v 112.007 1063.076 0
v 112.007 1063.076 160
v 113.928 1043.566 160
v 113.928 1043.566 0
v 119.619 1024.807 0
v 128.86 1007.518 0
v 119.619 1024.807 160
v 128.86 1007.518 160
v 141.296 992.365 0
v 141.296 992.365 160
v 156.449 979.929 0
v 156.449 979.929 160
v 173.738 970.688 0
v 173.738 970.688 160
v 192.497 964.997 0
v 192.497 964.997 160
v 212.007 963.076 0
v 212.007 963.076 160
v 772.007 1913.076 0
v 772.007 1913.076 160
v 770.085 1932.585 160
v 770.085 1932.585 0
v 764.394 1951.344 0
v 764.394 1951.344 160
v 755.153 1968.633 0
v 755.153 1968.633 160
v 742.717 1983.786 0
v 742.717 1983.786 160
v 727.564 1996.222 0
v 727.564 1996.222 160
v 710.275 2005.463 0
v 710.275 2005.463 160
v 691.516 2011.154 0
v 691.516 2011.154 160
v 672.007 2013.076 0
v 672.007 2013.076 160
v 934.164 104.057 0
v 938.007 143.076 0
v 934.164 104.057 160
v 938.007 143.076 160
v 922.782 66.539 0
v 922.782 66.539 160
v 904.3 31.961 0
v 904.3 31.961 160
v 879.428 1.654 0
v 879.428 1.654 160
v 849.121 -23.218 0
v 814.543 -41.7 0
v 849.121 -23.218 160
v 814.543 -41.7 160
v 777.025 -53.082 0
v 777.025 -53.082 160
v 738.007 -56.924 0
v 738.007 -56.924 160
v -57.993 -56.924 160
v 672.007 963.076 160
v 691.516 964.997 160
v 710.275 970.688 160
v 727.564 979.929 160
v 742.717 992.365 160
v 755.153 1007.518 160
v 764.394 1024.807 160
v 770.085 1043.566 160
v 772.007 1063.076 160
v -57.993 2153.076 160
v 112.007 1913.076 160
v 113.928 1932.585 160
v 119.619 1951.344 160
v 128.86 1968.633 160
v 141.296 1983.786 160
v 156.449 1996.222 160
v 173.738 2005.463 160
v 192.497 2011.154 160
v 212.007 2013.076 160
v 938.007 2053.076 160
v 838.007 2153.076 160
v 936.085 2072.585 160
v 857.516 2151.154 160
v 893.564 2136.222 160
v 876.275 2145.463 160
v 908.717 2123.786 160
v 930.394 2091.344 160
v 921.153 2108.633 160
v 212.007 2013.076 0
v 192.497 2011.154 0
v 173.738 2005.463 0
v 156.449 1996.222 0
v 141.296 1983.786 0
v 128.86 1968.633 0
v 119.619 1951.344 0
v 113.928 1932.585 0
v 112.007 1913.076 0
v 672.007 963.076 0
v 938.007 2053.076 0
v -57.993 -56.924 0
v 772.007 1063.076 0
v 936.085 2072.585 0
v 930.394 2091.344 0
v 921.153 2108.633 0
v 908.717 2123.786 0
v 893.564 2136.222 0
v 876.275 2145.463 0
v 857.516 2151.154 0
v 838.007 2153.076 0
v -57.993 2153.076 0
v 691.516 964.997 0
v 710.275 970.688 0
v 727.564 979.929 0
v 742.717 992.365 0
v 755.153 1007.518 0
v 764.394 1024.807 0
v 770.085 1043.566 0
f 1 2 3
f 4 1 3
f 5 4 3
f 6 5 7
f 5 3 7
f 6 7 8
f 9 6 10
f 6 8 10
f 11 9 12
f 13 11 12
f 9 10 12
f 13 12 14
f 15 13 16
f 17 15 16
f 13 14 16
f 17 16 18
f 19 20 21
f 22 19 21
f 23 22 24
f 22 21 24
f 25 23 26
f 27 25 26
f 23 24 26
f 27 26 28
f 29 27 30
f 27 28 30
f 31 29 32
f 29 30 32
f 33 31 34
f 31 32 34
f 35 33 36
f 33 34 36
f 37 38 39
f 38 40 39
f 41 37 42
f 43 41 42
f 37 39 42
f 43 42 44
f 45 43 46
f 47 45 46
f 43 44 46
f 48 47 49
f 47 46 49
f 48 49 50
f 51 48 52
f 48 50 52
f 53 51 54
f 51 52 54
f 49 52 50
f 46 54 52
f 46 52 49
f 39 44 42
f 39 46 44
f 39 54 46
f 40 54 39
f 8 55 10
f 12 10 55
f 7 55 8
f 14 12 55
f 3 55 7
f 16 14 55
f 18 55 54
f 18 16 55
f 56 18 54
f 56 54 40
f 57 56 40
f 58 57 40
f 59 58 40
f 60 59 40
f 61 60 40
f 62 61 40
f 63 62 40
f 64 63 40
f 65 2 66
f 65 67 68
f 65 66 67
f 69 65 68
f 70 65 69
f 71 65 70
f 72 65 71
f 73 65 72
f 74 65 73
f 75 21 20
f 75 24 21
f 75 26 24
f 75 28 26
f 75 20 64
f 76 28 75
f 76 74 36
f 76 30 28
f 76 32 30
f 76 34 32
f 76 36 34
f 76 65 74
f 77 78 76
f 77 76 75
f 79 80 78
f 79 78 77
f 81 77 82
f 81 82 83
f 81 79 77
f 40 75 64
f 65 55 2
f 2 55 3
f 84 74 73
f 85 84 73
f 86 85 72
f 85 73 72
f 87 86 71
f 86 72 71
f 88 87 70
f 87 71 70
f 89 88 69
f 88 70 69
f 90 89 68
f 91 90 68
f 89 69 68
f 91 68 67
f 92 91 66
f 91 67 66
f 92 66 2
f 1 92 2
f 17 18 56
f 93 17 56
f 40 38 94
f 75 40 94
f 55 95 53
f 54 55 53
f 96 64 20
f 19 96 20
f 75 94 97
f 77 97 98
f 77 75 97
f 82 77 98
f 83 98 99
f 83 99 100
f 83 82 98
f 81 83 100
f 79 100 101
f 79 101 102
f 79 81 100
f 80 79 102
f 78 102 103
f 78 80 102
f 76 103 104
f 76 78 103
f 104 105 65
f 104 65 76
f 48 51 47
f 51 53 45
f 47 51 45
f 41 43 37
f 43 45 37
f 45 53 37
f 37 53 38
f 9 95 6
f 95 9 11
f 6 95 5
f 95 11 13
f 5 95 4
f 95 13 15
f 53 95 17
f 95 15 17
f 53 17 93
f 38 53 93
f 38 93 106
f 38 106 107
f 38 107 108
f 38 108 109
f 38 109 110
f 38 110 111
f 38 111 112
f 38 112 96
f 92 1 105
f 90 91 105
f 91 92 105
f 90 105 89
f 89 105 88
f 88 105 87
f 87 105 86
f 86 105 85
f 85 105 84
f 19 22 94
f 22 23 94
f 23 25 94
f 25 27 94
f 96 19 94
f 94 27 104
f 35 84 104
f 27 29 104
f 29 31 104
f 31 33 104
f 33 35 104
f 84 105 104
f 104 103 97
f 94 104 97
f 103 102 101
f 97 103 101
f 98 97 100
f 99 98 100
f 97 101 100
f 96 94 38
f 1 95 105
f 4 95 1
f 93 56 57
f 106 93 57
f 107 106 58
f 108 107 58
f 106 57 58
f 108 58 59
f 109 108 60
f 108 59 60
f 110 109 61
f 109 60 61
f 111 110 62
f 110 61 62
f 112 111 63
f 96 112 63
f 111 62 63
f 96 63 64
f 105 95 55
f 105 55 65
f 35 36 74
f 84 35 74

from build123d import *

# Parameters (mm, degrees)
F0_W     = 996
F0_H     = 2210
F1_DEPTH = 160
F2_R     = 100
F3_R     = 200
F5_DEPTH = 160


with BuildPart() as f1:
    # F0 (on Top) → F1 (new body)
    with BuildSketch(Plane.XY):
        with Locations((440.006502, 1048.075508)):
            Rectangle(F0_W, F0_H)
    extrude(amount=F1_DEPTH)

    # F2
    f2_edges = [f1.edges().sort_by_distance(p)[0] for p in [
        (938.006502, 2153.075508, 80),
    ]]
    fillet(f2_edges, radius=F2_R)

    # F3
    f3_edges = [f1.edges().sort_by_distance(p)[0] for p in [
        (938.006502, -56.924492, 80),
    ]]
    fillet(f3_edges, radius=F3_R)

    # F4 (on face) → F5 (cut, through all)
    with BuildSketch(Plane.XY.offset(160)):
        with BuildLine():
            Line((672.006502, 2013.075508), (212.006502, 2013.075508))
            ThreePointArc((212.006502, 2013.075508), (141.295824, 1983.786186), (112.006502, 1913.075508))
            Line((112.006502, 1913.075508), (112.006502, 1063.075508))
            ThreePointArc((112.006502, 1063.075508), (141.295824, 992.36483), (212.006502, 963.075508))
            Line((212.006502, 963.075508), (672.006502, 963.075508))
            ThreePointArc((672.006502, 963.075508), (742.71718, 992.36483), (772.006502, 1063.075508))
            Line((772.006502, 1063.075508), (772.006502, 1913.075508))
            ThreePointArc((772.006502, 1913.075508), (742.71718, 1983.786186), (672.006502, 2013.075508))
        make_face()
    extrude(amount=-F5_DEPTH, mode=Mode.SUBTRACT)


solid = f1.part
